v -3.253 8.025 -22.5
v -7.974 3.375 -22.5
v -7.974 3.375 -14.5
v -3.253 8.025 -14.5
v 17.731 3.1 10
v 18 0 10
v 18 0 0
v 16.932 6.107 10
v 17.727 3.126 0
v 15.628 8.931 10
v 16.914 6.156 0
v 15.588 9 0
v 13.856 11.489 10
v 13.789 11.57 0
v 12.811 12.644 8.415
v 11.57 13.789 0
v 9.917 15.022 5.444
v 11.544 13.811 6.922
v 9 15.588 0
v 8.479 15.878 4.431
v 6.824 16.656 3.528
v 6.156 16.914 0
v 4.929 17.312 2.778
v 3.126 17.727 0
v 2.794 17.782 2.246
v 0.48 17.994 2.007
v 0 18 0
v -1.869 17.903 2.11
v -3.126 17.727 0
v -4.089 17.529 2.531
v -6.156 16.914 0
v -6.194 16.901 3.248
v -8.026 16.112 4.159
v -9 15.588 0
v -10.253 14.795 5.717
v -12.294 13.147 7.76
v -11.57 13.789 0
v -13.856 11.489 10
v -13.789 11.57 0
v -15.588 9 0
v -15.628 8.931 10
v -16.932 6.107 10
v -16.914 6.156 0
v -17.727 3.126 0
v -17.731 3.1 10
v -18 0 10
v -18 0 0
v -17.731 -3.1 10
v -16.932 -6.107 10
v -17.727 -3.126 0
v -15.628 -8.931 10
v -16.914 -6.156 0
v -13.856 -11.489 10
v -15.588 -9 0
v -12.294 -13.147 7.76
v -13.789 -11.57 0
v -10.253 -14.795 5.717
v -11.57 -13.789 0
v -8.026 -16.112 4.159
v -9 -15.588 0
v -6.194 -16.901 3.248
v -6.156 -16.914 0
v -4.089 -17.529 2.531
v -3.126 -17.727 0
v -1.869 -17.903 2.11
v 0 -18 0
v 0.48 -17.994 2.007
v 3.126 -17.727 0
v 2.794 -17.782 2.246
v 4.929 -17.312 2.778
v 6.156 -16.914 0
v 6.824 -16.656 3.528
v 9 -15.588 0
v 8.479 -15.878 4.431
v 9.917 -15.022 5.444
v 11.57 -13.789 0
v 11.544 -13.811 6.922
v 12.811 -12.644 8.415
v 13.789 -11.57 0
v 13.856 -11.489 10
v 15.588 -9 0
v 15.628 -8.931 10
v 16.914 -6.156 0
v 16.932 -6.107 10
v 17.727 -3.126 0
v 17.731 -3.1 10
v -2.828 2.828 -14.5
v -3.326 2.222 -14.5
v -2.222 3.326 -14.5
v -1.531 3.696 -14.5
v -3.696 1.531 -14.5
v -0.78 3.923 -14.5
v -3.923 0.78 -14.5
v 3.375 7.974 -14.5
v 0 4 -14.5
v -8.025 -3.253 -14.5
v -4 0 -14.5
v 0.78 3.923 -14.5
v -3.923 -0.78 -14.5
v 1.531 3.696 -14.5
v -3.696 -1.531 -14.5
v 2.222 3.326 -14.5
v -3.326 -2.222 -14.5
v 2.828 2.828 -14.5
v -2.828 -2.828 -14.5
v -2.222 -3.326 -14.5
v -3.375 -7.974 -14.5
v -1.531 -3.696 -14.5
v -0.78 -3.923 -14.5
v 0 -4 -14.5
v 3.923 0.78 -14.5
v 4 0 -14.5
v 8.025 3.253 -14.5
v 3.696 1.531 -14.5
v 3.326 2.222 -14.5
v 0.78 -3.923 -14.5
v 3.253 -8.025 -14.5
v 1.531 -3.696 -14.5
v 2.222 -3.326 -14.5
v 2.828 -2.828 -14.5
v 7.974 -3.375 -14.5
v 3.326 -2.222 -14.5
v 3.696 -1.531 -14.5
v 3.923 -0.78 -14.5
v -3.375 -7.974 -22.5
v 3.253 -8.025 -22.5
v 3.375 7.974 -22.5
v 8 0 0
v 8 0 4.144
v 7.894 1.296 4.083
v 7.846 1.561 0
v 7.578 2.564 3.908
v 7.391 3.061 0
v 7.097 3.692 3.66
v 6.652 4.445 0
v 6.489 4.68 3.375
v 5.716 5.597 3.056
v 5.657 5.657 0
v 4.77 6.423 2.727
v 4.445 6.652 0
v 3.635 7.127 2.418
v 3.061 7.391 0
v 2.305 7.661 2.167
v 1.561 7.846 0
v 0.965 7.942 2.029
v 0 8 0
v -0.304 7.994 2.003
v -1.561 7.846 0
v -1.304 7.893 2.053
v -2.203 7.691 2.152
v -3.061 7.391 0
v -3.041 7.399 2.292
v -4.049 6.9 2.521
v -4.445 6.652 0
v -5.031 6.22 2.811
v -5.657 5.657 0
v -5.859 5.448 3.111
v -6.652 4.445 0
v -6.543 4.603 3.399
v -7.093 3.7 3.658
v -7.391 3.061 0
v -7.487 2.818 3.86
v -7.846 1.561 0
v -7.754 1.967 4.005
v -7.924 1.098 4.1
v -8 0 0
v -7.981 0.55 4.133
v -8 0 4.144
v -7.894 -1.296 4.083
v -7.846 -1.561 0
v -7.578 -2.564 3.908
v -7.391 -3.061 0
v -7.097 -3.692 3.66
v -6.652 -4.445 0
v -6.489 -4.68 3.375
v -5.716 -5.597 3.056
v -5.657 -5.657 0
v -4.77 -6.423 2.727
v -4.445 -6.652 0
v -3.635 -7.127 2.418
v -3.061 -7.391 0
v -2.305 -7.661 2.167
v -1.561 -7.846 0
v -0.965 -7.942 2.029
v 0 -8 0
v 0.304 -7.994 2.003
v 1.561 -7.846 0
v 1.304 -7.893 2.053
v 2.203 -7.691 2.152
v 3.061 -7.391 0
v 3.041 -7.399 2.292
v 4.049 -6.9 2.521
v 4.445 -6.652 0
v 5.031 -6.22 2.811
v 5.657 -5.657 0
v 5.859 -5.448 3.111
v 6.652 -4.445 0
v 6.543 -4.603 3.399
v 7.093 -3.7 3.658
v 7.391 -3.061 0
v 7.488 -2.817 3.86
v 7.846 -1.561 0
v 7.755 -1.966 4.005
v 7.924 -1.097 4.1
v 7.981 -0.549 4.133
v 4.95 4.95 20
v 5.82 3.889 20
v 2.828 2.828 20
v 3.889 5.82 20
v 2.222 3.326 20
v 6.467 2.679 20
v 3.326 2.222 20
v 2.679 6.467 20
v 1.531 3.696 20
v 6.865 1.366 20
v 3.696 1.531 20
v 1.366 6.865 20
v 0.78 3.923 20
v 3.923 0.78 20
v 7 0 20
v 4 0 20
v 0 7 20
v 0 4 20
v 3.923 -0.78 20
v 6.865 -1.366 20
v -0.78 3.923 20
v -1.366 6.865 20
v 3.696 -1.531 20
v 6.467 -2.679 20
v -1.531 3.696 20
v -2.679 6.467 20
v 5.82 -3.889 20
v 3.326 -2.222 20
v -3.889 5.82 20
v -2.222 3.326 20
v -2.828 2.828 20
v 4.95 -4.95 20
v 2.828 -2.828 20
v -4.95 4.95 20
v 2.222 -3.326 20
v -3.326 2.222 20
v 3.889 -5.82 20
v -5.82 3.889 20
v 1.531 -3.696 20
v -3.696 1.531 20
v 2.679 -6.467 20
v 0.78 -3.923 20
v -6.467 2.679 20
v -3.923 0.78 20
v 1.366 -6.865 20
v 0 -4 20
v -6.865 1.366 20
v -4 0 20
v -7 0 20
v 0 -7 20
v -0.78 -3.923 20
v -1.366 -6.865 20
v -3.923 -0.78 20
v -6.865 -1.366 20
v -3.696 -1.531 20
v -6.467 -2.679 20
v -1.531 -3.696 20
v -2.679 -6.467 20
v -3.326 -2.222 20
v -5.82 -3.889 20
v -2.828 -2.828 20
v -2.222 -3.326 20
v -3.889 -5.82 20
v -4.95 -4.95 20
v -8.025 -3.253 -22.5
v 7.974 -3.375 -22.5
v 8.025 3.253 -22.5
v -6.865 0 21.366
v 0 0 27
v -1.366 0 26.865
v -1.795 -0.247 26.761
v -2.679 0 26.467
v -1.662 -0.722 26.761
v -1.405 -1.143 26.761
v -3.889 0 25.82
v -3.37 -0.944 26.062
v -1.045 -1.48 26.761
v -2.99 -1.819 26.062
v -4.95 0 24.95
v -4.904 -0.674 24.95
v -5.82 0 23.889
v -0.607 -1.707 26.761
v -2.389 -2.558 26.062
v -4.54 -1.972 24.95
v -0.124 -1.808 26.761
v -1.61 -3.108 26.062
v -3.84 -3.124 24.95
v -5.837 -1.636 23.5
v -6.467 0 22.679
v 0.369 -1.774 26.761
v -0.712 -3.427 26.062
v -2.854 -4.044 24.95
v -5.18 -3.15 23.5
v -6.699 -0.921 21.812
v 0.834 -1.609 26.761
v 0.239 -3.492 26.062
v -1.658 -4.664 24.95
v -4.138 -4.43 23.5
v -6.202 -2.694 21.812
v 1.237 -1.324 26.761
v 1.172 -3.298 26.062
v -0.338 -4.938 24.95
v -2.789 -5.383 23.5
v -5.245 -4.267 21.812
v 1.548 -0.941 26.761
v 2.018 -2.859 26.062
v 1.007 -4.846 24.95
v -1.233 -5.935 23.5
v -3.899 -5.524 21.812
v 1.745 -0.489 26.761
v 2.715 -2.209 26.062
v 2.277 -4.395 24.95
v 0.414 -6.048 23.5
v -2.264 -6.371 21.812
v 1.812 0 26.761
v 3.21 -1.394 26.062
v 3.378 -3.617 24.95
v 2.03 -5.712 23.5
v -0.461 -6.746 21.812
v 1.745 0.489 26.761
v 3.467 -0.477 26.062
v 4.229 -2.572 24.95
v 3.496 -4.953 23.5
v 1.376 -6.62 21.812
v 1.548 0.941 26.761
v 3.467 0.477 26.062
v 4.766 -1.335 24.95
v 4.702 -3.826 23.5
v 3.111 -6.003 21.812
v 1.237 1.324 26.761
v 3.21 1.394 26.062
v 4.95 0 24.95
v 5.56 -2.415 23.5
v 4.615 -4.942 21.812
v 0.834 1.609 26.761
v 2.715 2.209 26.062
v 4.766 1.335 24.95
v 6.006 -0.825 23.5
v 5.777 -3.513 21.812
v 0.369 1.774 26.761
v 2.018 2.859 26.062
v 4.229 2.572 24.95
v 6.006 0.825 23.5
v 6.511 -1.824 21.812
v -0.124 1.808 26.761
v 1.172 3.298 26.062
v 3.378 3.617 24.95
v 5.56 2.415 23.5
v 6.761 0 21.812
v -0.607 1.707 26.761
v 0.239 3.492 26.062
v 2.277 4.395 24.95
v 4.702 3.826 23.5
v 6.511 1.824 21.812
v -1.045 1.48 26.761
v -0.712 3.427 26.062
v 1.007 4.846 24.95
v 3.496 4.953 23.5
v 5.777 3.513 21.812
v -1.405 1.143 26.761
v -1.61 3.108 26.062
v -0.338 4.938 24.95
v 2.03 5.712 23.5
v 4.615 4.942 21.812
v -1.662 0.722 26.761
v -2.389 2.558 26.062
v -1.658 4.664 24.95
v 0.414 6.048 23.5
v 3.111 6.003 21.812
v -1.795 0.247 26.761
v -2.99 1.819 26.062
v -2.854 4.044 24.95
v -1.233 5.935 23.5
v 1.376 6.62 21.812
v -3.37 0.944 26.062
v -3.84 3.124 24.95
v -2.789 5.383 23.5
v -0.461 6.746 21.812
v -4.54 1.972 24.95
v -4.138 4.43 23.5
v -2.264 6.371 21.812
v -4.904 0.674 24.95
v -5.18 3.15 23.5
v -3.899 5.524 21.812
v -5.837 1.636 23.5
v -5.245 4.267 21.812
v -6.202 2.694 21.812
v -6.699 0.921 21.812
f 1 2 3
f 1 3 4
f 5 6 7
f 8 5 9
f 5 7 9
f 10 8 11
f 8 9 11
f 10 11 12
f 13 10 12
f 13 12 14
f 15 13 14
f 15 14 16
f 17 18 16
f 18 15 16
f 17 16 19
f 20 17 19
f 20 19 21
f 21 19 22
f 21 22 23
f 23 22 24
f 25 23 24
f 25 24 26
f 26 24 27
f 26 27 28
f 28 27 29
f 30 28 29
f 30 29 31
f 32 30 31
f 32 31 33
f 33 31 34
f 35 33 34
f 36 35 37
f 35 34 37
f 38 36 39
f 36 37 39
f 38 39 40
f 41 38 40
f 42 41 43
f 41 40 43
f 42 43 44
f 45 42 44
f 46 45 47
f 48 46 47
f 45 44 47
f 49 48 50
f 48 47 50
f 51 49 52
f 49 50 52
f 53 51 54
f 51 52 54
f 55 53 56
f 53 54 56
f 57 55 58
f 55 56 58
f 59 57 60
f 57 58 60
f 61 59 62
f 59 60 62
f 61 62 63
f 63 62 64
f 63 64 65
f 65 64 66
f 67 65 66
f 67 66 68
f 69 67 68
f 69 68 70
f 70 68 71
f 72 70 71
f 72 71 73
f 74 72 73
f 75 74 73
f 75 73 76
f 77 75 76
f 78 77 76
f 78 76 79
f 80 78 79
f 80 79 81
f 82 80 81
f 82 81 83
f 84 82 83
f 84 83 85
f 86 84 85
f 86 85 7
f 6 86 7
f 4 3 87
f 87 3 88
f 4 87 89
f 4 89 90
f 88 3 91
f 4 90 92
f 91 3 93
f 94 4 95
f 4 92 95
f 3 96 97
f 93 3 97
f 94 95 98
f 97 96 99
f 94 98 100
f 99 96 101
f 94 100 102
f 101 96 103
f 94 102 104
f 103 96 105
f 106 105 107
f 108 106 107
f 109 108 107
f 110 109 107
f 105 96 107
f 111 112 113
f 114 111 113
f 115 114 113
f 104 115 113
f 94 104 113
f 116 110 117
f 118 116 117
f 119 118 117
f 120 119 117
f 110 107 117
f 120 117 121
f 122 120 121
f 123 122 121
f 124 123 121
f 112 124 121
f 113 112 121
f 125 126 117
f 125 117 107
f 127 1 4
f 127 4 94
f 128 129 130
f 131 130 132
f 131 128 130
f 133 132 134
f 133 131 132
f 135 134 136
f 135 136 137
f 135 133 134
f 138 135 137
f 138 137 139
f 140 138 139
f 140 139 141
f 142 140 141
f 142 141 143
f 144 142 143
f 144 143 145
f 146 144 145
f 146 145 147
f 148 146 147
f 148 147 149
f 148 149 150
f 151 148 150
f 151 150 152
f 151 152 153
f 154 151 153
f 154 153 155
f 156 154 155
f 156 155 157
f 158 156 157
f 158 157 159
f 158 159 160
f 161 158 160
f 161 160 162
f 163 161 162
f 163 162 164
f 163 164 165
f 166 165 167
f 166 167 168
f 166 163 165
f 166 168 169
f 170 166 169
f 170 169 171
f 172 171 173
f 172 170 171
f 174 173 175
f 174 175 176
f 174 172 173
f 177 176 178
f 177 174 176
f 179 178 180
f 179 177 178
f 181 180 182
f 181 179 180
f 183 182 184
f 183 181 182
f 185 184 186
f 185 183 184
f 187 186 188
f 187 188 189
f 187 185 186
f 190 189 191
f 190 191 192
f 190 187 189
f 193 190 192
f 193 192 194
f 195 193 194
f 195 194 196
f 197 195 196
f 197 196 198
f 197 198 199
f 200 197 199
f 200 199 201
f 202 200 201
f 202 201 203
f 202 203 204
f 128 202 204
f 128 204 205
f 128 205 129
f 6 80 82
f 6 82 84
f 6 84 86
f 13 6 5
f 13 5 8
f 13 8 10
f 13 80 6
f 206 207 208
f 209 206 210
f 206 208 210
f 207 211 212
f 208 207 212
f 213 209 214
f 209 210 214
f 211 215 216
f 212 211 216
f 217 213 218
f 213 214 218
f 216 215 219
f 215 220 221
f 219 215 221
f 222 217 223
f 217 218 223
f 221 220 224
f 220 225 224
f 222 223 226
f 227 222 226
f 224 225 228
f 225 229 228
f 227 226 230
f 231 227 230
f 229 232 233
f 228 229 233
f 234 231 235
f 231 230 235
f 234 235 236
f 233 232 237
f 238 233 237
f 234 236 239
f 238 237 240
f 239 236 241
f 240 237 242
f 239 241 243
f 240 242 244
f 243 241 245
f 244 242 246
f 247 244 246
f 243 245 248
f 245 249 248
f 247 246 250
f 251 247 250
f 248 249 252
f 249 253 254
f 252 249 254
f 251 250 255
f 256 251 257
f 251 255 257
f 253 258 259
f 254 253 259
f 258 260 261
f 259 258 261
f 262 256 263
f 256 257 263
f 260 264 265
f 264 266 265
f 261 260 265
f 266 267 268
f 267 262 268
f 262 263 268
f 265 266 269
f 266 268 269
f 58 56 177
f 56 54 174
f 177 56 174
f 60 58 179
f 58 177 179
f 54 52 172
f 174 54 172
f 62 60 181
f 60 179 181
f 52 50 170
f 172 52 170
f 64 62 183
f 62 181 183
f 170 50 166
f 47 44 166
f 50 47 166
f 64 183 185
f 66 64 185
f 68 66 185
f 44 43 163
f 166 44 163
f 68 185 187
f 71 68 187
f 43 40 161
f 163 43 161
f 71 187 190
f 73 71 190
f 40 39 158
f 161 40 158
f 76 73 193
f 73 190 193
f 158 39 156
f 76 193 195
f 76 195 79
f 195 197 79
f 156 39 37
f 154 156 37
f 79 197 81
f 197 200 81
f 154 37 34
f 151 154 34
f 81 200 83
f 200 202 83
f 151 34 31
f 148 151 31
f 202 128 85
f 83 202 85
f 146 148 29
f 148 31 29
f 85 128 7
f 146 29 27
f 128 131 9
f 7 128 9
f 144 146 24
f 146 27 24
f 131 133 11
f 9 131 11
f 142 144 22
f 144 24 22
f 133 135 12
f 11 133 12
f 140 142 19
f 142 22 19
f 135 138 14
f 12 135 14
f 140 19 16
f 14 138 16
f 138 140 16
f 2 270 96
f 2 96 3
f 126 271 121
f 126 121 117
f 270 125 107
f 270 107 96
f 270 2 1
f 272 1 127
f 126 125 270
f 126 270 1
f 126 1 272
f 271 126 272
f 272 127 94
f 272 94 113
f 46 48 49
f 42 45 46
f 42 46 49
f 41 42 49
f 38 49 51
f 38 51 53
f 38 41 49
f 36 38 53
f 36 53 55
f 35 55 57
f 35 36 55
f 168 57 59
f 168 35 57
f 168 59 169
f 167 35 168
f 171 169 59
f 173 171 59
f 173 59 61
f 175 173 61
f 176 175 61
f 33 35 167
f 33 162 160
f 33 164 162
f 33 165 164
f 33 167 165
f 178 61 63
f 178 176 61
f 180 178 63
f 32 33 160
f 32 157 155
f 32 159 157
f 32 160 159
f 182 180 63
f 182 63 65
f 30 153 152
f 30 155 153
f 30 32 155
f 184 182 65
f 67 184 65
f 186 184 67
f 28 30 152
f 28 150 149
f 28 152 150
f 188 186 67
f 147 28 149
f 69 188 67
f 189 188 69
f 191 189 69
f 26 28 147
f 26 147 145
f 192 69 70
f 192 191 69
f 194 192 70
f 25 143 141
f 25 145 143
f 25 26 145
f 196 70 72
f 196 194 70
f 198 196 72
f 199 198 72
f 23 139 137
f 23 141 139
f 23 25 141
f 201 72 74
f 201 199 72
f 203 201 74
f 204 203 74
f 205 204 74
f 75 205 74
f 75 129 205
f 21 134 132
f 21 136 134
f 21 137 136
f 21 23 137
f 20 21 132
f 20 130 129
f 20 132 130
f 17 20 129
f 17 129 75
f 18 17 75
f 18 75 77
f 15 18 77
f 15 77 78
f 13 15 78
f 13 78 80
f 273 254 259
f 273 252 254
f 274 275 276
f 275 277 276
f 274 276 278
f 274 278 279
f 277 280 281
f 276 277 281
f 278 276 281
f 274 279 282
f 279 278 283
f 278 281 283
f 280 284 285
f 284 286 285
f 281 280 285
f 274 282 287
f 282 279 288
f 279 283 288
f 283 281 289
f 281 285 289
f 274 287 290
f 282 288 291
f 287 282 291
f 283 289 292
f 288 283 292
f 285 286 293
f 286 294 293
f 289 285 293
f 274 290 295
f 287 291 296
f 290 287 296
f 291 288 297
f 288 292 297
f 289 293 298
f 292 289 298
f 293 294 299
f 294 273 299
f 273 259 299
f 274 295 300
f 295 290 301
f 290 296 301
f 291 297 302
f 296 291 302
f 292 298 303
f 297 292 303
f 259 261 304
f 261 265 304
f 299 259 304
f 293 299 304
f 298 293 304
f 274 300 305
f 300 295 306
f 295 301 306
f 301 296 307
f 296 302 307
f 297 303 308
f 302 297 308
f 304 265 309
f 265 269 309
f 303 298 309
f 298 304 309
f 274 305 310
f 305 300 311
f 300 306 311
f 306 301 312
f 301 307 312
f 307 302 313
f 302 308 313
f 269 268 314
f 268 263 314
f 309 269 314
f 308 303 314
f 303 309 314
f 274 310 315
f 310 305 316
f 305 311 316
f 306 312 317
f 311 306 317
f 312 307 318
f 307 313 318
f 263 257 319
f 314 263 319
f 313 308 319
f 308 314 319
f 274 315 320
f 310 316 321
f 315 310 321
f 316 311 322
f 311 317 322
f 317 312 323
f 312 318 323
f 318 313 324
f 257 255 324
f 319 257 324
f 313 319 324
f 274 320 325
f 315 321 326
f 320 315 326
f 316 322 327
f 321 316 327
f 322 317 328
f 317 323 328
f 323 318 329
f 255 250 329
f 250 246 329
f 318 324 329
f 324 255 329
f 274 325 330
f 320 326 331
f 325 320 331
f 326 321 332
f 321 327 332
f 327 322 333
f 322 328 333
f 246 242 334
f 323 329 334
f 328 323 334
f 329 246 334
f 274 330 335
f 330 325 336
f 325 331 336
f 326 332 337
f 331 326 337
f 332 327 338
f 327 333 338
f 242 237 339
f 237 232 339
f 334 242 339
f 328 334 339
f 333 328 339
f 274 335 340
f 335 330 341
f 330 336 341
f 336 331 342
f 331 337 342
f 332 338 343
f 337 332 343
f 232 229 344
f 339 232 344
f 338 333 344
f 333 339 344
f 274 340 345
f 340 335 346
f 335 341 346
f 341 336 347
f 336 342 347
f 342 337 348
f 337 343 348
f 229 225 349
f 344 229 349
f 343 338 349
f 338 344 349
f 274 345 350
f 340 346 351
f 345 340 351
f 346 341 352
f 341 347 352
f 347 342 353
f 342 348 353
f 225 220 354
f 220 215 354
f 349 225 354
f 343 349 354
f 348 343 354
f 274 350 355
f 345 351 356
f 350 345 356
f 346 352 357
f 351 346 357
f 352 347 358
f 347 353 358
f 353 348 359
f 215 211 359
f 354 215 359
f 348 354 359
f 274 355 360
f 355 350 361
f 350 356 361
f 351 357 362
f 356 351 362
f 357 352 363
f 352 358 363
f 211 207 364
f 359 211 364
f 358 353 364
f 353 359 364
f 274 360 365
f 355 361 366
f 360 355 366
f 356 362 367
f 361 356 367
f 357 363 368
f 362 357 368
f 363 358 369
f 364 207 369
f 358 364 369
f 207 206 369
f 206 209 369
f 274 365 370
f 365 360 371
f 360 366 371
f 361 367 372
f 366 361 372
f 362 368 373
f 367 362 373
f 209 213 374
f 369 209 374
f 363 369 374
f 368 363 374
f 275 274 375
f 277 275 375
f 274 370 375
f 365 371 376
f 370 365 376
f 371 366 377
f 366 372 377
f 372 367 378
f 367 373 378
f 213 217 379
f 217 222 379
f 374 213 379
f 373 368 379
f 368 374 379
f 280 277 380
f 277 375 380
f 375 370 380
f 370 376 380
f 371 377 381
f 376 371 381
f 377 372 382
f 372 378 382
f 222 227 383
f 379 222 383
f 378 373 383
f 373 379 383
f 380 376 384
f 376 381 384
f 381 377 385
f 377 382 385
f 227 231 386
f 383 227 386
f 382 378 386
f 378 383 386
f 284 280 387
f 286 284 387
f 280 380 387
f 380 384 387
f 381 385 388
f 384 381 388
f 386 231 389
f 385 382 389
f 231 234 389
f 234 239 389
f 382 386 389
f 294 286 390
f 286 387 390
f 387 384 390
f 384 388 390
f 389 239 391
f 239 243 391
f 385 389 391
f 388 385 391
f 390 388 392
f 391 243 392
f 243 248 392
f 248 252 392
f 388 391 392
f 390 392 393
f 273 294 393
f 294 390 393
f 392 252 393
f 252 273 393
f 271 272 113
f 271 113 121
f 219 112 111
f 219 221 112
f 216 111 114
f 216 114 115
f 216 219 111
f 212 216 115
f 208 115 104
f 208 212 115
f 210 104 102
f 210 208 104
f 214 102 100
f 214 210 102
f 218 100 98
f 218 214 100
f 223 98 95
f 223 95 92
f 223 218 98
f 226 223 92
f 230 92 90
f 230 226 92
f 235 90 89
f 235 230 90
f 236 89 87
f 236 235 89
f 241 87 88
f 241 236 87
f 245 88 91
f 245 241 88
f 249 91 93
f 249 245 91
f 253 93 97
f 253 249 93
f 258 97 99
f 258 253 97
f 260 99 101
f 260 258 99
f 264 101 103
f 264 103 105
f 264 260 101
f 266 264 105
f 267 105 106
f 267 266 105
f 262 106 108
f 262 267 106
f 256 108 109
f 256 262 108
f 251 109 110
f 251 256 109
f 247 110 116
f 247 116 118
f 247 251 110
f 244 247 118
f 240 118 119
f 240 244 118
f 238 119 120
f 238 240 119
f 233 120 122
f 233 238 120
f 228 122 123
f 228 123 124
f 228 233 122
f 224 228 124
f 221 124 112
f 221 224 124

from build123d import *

# Parameters (mm, degrees)
F0_R          = 18
F0_R_2        = 8
F1_DEPTH      = 10
F2_R          = 16
F3_DEPTH      = 25
F3_DEPTH_BACK = 25
F4_R          = 4
F6_DEPTH      = 22.5
F9_DEPTH      = 8


with BuildPart() as f1:
    # F0 (on Top) → F1 (new body)
    with BuildSketch(Plane.XY):
        Circle(F0_R)
        Circle(F0_R_2, mode=Mode.SUBTRACT)
    extrude(amount=F1_DEPTH)

    # F2 (on Front) → F3 (cut, two sides)
    with BuildSketch(Plane.XZ) as f3_sk:
        with Locations((0, 18)):
            Circle(F2_R)
    extrude(amount=-F3_DEPTH, mode=Mode.SUBTRACT)
    extrude(f3_sk.sketch, amount=F3_DEPTH_BACK, mode=Mode.SUBTRACT)


with BuildPart() as f6:
    # F4 (on Top) → F6 (new body, symmetric)
    with BuildSketch(Plane.XY):
        Circle(F4_R)
    extrude(amount=F6_DEPTH, both=True)

    # F5 (on Front) → F7 (revolve)
    with BuildSketch(Plane.XZ):
        with BuildLine():
            Line((-7, 20), (0, 20))
            Line((0, 20), (0, 27))
            ThreePointArc((0, 27), (-4.9497474683, 24.9497474683), (-7, 20))
        make_face()
    revolve(axis=Axis((0, 0, 32.4448695779), (0, 0, 1)))

    # F8 (on face) → F9 (join)
    with BuildSketch(Plane(origin=(0, 0, -22.5), x_dir=(1, 0, 0), z_dir=(0, 0, -1))):
        Polygon((7.9744729822, 3.3746769732), (3.25254695, 8.0250608941), (-3.3746769732, 7.9744729822), (-8.0250608941, 3.25254695), (-7.9744729822, -3.3746769732), (-3.25254695, -8.0250608941), (3.3746769732, -7.9744729822), (8.0250608941, -3.25254695), align=None)
    extrude(amount=-F9_DEPTH)


solid = Compound([f1.part, f6.part])
